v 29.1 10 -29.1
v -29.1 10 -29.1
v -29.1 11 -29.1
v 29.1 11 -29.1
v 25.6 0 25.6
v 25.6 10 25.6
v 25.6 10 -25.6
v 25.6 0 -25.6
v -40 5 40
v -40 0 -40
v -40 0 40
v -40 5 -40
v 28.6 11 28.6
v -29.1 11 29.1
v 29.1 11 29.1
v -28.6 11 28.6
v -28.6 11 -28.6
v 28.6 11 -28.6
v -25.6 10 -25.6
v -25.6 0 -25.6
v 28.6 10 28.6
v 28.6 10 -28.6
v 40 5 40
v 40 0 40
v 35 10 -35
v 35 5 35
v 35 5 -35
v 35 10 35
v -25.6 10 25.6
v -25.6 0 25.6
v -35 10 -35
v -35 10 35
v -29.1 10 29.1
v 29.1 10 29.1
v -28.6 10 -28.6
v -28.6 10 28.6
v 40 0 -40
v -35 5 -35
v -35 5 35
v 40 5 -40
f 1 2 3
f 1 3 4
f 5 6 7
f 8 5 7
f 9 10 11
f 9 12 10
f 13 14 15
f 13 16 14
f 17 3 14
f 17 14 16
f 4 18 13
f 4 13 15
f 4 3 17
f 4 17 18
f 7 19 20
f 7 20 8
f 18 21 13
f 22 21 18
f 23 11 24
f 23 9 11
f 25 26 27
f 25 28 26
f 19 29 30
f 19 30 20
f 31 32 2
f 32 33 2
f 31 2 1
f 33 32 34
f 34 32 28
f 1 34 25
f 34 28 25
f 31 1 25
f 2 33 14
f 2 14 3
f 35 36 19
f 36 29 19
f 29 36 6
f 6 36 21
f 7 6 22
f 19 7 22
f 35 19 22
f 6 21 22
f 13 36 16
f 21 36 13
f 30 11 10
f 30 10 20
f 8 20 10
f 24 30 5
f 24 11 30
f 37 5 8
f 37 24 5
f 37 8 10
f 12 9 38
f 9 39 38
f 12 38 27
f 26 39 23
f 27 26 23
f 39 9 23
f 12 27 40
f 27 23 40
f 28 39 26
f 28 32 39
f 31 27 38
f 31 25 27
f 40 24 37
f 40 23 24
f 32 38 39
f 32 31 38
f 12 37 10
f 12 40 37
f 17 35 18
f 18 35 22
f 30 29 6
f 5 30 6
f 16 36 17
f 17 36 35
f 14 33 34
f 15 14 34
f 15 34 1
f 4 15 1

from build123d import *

# Parameters (mm, degrees)
SKETCH_4_W          = 51.2
SKETCH_4_H          = 51.2
CUT_EXTRUDE_1_DEPTH = 58.445626622
SKETCH_5_W          = 58.2
SKETCH_5_H          = 58.2
SKETCH_5_W_2        = 57.2
SKETCH_5_H_2        = 57.2
EXTRUDE_1_DEPTH     = 1


with BuildPart() as part:
    # Эскиз1 → По сечениям1 section 0
    with BuildSketch(Plane(origin=(0, 0, 0), x_dir=(1, 0, 0), z_dir=(0, 1, 0))):
        with BuildLine():
            Line((-40, -40), (40, -40))
            Line((40, -40), (40, 40))
            Line((40, 40), (-40, 40))
            Line((-40, 40), (-40, -40))
        make_face()
    # Эскиз2 → По сечениям1 section 1
    with BuildSketch(Plane(origin=(0, 5, 0), x_dir=(1, 0, 0), z_dir=(0, 1, 0))):
        with BuildLine():
            Line((-40, -40), (40, -40))
            Line((40, -40), (40, 40))
            Line((40, 40), (-40, 40))
            Line((-40, 40), (-40, -40))
        make_face()
    loft()

    # Эскиз2<3> → По сечениям2 section 0
    with BuildSketch(Plane(origin=(0, 5, 0), x_dir=(1, 0, 0), z_dir=(0, 1, 0))):
        with BuildLine():
            Line((-35, -35), (35, -35))
            Line((35, -35), (35, 35))
            Line((35, 35), (-35, 35))
            Line((-35, 35), (-35, -35))
        make_face()
    # Эскиз3 → По сечениям2 section 1
    with BuildSketch(Plane(origin=(0, 10, 0), x_dir=(1, 0, 0), z_dir=(0, 1, 0))):
        with BuildLine():
            Line((-35, -35), (35, -35))
            Line((35, -35), (35, 35))
            Line((35, 35), (-35, 35))
            Line((-35, 35), (-35, -35))
        make_face()
    loft()

    # Эскиз4 → Вырез-Вытянуть1 (cut, through all)
    with BuildSketch(Plane(origin=(0, 10, 0), x_dir=(1, 0, 0), z_dir=(0, 1, 0))):
        Rectangle(SKETCH_4_W, SKETCH_4_H)
    extrude(amount=-CUT_EXTRUDE_1_DEPTH, mode=Mode.SUBTRACT)

    # Эскиз5 → Бобышка-Вытянуть1 (add)
    with BuildSketch(Plane(origin=(0, 10, 0), x_dir=(1, 0, 0), z_dir=(0, 1, 0))):
        Rectangle(SKETCH_5_W, SKETCH_5_H)
        Rectangle(SKETCH_5_W_2, SKETCH_5_H_2, mode=Mode.SUBTRACT)
    extrude(amount=EXTRUDE_1_DEPTH)


solid = part.part
